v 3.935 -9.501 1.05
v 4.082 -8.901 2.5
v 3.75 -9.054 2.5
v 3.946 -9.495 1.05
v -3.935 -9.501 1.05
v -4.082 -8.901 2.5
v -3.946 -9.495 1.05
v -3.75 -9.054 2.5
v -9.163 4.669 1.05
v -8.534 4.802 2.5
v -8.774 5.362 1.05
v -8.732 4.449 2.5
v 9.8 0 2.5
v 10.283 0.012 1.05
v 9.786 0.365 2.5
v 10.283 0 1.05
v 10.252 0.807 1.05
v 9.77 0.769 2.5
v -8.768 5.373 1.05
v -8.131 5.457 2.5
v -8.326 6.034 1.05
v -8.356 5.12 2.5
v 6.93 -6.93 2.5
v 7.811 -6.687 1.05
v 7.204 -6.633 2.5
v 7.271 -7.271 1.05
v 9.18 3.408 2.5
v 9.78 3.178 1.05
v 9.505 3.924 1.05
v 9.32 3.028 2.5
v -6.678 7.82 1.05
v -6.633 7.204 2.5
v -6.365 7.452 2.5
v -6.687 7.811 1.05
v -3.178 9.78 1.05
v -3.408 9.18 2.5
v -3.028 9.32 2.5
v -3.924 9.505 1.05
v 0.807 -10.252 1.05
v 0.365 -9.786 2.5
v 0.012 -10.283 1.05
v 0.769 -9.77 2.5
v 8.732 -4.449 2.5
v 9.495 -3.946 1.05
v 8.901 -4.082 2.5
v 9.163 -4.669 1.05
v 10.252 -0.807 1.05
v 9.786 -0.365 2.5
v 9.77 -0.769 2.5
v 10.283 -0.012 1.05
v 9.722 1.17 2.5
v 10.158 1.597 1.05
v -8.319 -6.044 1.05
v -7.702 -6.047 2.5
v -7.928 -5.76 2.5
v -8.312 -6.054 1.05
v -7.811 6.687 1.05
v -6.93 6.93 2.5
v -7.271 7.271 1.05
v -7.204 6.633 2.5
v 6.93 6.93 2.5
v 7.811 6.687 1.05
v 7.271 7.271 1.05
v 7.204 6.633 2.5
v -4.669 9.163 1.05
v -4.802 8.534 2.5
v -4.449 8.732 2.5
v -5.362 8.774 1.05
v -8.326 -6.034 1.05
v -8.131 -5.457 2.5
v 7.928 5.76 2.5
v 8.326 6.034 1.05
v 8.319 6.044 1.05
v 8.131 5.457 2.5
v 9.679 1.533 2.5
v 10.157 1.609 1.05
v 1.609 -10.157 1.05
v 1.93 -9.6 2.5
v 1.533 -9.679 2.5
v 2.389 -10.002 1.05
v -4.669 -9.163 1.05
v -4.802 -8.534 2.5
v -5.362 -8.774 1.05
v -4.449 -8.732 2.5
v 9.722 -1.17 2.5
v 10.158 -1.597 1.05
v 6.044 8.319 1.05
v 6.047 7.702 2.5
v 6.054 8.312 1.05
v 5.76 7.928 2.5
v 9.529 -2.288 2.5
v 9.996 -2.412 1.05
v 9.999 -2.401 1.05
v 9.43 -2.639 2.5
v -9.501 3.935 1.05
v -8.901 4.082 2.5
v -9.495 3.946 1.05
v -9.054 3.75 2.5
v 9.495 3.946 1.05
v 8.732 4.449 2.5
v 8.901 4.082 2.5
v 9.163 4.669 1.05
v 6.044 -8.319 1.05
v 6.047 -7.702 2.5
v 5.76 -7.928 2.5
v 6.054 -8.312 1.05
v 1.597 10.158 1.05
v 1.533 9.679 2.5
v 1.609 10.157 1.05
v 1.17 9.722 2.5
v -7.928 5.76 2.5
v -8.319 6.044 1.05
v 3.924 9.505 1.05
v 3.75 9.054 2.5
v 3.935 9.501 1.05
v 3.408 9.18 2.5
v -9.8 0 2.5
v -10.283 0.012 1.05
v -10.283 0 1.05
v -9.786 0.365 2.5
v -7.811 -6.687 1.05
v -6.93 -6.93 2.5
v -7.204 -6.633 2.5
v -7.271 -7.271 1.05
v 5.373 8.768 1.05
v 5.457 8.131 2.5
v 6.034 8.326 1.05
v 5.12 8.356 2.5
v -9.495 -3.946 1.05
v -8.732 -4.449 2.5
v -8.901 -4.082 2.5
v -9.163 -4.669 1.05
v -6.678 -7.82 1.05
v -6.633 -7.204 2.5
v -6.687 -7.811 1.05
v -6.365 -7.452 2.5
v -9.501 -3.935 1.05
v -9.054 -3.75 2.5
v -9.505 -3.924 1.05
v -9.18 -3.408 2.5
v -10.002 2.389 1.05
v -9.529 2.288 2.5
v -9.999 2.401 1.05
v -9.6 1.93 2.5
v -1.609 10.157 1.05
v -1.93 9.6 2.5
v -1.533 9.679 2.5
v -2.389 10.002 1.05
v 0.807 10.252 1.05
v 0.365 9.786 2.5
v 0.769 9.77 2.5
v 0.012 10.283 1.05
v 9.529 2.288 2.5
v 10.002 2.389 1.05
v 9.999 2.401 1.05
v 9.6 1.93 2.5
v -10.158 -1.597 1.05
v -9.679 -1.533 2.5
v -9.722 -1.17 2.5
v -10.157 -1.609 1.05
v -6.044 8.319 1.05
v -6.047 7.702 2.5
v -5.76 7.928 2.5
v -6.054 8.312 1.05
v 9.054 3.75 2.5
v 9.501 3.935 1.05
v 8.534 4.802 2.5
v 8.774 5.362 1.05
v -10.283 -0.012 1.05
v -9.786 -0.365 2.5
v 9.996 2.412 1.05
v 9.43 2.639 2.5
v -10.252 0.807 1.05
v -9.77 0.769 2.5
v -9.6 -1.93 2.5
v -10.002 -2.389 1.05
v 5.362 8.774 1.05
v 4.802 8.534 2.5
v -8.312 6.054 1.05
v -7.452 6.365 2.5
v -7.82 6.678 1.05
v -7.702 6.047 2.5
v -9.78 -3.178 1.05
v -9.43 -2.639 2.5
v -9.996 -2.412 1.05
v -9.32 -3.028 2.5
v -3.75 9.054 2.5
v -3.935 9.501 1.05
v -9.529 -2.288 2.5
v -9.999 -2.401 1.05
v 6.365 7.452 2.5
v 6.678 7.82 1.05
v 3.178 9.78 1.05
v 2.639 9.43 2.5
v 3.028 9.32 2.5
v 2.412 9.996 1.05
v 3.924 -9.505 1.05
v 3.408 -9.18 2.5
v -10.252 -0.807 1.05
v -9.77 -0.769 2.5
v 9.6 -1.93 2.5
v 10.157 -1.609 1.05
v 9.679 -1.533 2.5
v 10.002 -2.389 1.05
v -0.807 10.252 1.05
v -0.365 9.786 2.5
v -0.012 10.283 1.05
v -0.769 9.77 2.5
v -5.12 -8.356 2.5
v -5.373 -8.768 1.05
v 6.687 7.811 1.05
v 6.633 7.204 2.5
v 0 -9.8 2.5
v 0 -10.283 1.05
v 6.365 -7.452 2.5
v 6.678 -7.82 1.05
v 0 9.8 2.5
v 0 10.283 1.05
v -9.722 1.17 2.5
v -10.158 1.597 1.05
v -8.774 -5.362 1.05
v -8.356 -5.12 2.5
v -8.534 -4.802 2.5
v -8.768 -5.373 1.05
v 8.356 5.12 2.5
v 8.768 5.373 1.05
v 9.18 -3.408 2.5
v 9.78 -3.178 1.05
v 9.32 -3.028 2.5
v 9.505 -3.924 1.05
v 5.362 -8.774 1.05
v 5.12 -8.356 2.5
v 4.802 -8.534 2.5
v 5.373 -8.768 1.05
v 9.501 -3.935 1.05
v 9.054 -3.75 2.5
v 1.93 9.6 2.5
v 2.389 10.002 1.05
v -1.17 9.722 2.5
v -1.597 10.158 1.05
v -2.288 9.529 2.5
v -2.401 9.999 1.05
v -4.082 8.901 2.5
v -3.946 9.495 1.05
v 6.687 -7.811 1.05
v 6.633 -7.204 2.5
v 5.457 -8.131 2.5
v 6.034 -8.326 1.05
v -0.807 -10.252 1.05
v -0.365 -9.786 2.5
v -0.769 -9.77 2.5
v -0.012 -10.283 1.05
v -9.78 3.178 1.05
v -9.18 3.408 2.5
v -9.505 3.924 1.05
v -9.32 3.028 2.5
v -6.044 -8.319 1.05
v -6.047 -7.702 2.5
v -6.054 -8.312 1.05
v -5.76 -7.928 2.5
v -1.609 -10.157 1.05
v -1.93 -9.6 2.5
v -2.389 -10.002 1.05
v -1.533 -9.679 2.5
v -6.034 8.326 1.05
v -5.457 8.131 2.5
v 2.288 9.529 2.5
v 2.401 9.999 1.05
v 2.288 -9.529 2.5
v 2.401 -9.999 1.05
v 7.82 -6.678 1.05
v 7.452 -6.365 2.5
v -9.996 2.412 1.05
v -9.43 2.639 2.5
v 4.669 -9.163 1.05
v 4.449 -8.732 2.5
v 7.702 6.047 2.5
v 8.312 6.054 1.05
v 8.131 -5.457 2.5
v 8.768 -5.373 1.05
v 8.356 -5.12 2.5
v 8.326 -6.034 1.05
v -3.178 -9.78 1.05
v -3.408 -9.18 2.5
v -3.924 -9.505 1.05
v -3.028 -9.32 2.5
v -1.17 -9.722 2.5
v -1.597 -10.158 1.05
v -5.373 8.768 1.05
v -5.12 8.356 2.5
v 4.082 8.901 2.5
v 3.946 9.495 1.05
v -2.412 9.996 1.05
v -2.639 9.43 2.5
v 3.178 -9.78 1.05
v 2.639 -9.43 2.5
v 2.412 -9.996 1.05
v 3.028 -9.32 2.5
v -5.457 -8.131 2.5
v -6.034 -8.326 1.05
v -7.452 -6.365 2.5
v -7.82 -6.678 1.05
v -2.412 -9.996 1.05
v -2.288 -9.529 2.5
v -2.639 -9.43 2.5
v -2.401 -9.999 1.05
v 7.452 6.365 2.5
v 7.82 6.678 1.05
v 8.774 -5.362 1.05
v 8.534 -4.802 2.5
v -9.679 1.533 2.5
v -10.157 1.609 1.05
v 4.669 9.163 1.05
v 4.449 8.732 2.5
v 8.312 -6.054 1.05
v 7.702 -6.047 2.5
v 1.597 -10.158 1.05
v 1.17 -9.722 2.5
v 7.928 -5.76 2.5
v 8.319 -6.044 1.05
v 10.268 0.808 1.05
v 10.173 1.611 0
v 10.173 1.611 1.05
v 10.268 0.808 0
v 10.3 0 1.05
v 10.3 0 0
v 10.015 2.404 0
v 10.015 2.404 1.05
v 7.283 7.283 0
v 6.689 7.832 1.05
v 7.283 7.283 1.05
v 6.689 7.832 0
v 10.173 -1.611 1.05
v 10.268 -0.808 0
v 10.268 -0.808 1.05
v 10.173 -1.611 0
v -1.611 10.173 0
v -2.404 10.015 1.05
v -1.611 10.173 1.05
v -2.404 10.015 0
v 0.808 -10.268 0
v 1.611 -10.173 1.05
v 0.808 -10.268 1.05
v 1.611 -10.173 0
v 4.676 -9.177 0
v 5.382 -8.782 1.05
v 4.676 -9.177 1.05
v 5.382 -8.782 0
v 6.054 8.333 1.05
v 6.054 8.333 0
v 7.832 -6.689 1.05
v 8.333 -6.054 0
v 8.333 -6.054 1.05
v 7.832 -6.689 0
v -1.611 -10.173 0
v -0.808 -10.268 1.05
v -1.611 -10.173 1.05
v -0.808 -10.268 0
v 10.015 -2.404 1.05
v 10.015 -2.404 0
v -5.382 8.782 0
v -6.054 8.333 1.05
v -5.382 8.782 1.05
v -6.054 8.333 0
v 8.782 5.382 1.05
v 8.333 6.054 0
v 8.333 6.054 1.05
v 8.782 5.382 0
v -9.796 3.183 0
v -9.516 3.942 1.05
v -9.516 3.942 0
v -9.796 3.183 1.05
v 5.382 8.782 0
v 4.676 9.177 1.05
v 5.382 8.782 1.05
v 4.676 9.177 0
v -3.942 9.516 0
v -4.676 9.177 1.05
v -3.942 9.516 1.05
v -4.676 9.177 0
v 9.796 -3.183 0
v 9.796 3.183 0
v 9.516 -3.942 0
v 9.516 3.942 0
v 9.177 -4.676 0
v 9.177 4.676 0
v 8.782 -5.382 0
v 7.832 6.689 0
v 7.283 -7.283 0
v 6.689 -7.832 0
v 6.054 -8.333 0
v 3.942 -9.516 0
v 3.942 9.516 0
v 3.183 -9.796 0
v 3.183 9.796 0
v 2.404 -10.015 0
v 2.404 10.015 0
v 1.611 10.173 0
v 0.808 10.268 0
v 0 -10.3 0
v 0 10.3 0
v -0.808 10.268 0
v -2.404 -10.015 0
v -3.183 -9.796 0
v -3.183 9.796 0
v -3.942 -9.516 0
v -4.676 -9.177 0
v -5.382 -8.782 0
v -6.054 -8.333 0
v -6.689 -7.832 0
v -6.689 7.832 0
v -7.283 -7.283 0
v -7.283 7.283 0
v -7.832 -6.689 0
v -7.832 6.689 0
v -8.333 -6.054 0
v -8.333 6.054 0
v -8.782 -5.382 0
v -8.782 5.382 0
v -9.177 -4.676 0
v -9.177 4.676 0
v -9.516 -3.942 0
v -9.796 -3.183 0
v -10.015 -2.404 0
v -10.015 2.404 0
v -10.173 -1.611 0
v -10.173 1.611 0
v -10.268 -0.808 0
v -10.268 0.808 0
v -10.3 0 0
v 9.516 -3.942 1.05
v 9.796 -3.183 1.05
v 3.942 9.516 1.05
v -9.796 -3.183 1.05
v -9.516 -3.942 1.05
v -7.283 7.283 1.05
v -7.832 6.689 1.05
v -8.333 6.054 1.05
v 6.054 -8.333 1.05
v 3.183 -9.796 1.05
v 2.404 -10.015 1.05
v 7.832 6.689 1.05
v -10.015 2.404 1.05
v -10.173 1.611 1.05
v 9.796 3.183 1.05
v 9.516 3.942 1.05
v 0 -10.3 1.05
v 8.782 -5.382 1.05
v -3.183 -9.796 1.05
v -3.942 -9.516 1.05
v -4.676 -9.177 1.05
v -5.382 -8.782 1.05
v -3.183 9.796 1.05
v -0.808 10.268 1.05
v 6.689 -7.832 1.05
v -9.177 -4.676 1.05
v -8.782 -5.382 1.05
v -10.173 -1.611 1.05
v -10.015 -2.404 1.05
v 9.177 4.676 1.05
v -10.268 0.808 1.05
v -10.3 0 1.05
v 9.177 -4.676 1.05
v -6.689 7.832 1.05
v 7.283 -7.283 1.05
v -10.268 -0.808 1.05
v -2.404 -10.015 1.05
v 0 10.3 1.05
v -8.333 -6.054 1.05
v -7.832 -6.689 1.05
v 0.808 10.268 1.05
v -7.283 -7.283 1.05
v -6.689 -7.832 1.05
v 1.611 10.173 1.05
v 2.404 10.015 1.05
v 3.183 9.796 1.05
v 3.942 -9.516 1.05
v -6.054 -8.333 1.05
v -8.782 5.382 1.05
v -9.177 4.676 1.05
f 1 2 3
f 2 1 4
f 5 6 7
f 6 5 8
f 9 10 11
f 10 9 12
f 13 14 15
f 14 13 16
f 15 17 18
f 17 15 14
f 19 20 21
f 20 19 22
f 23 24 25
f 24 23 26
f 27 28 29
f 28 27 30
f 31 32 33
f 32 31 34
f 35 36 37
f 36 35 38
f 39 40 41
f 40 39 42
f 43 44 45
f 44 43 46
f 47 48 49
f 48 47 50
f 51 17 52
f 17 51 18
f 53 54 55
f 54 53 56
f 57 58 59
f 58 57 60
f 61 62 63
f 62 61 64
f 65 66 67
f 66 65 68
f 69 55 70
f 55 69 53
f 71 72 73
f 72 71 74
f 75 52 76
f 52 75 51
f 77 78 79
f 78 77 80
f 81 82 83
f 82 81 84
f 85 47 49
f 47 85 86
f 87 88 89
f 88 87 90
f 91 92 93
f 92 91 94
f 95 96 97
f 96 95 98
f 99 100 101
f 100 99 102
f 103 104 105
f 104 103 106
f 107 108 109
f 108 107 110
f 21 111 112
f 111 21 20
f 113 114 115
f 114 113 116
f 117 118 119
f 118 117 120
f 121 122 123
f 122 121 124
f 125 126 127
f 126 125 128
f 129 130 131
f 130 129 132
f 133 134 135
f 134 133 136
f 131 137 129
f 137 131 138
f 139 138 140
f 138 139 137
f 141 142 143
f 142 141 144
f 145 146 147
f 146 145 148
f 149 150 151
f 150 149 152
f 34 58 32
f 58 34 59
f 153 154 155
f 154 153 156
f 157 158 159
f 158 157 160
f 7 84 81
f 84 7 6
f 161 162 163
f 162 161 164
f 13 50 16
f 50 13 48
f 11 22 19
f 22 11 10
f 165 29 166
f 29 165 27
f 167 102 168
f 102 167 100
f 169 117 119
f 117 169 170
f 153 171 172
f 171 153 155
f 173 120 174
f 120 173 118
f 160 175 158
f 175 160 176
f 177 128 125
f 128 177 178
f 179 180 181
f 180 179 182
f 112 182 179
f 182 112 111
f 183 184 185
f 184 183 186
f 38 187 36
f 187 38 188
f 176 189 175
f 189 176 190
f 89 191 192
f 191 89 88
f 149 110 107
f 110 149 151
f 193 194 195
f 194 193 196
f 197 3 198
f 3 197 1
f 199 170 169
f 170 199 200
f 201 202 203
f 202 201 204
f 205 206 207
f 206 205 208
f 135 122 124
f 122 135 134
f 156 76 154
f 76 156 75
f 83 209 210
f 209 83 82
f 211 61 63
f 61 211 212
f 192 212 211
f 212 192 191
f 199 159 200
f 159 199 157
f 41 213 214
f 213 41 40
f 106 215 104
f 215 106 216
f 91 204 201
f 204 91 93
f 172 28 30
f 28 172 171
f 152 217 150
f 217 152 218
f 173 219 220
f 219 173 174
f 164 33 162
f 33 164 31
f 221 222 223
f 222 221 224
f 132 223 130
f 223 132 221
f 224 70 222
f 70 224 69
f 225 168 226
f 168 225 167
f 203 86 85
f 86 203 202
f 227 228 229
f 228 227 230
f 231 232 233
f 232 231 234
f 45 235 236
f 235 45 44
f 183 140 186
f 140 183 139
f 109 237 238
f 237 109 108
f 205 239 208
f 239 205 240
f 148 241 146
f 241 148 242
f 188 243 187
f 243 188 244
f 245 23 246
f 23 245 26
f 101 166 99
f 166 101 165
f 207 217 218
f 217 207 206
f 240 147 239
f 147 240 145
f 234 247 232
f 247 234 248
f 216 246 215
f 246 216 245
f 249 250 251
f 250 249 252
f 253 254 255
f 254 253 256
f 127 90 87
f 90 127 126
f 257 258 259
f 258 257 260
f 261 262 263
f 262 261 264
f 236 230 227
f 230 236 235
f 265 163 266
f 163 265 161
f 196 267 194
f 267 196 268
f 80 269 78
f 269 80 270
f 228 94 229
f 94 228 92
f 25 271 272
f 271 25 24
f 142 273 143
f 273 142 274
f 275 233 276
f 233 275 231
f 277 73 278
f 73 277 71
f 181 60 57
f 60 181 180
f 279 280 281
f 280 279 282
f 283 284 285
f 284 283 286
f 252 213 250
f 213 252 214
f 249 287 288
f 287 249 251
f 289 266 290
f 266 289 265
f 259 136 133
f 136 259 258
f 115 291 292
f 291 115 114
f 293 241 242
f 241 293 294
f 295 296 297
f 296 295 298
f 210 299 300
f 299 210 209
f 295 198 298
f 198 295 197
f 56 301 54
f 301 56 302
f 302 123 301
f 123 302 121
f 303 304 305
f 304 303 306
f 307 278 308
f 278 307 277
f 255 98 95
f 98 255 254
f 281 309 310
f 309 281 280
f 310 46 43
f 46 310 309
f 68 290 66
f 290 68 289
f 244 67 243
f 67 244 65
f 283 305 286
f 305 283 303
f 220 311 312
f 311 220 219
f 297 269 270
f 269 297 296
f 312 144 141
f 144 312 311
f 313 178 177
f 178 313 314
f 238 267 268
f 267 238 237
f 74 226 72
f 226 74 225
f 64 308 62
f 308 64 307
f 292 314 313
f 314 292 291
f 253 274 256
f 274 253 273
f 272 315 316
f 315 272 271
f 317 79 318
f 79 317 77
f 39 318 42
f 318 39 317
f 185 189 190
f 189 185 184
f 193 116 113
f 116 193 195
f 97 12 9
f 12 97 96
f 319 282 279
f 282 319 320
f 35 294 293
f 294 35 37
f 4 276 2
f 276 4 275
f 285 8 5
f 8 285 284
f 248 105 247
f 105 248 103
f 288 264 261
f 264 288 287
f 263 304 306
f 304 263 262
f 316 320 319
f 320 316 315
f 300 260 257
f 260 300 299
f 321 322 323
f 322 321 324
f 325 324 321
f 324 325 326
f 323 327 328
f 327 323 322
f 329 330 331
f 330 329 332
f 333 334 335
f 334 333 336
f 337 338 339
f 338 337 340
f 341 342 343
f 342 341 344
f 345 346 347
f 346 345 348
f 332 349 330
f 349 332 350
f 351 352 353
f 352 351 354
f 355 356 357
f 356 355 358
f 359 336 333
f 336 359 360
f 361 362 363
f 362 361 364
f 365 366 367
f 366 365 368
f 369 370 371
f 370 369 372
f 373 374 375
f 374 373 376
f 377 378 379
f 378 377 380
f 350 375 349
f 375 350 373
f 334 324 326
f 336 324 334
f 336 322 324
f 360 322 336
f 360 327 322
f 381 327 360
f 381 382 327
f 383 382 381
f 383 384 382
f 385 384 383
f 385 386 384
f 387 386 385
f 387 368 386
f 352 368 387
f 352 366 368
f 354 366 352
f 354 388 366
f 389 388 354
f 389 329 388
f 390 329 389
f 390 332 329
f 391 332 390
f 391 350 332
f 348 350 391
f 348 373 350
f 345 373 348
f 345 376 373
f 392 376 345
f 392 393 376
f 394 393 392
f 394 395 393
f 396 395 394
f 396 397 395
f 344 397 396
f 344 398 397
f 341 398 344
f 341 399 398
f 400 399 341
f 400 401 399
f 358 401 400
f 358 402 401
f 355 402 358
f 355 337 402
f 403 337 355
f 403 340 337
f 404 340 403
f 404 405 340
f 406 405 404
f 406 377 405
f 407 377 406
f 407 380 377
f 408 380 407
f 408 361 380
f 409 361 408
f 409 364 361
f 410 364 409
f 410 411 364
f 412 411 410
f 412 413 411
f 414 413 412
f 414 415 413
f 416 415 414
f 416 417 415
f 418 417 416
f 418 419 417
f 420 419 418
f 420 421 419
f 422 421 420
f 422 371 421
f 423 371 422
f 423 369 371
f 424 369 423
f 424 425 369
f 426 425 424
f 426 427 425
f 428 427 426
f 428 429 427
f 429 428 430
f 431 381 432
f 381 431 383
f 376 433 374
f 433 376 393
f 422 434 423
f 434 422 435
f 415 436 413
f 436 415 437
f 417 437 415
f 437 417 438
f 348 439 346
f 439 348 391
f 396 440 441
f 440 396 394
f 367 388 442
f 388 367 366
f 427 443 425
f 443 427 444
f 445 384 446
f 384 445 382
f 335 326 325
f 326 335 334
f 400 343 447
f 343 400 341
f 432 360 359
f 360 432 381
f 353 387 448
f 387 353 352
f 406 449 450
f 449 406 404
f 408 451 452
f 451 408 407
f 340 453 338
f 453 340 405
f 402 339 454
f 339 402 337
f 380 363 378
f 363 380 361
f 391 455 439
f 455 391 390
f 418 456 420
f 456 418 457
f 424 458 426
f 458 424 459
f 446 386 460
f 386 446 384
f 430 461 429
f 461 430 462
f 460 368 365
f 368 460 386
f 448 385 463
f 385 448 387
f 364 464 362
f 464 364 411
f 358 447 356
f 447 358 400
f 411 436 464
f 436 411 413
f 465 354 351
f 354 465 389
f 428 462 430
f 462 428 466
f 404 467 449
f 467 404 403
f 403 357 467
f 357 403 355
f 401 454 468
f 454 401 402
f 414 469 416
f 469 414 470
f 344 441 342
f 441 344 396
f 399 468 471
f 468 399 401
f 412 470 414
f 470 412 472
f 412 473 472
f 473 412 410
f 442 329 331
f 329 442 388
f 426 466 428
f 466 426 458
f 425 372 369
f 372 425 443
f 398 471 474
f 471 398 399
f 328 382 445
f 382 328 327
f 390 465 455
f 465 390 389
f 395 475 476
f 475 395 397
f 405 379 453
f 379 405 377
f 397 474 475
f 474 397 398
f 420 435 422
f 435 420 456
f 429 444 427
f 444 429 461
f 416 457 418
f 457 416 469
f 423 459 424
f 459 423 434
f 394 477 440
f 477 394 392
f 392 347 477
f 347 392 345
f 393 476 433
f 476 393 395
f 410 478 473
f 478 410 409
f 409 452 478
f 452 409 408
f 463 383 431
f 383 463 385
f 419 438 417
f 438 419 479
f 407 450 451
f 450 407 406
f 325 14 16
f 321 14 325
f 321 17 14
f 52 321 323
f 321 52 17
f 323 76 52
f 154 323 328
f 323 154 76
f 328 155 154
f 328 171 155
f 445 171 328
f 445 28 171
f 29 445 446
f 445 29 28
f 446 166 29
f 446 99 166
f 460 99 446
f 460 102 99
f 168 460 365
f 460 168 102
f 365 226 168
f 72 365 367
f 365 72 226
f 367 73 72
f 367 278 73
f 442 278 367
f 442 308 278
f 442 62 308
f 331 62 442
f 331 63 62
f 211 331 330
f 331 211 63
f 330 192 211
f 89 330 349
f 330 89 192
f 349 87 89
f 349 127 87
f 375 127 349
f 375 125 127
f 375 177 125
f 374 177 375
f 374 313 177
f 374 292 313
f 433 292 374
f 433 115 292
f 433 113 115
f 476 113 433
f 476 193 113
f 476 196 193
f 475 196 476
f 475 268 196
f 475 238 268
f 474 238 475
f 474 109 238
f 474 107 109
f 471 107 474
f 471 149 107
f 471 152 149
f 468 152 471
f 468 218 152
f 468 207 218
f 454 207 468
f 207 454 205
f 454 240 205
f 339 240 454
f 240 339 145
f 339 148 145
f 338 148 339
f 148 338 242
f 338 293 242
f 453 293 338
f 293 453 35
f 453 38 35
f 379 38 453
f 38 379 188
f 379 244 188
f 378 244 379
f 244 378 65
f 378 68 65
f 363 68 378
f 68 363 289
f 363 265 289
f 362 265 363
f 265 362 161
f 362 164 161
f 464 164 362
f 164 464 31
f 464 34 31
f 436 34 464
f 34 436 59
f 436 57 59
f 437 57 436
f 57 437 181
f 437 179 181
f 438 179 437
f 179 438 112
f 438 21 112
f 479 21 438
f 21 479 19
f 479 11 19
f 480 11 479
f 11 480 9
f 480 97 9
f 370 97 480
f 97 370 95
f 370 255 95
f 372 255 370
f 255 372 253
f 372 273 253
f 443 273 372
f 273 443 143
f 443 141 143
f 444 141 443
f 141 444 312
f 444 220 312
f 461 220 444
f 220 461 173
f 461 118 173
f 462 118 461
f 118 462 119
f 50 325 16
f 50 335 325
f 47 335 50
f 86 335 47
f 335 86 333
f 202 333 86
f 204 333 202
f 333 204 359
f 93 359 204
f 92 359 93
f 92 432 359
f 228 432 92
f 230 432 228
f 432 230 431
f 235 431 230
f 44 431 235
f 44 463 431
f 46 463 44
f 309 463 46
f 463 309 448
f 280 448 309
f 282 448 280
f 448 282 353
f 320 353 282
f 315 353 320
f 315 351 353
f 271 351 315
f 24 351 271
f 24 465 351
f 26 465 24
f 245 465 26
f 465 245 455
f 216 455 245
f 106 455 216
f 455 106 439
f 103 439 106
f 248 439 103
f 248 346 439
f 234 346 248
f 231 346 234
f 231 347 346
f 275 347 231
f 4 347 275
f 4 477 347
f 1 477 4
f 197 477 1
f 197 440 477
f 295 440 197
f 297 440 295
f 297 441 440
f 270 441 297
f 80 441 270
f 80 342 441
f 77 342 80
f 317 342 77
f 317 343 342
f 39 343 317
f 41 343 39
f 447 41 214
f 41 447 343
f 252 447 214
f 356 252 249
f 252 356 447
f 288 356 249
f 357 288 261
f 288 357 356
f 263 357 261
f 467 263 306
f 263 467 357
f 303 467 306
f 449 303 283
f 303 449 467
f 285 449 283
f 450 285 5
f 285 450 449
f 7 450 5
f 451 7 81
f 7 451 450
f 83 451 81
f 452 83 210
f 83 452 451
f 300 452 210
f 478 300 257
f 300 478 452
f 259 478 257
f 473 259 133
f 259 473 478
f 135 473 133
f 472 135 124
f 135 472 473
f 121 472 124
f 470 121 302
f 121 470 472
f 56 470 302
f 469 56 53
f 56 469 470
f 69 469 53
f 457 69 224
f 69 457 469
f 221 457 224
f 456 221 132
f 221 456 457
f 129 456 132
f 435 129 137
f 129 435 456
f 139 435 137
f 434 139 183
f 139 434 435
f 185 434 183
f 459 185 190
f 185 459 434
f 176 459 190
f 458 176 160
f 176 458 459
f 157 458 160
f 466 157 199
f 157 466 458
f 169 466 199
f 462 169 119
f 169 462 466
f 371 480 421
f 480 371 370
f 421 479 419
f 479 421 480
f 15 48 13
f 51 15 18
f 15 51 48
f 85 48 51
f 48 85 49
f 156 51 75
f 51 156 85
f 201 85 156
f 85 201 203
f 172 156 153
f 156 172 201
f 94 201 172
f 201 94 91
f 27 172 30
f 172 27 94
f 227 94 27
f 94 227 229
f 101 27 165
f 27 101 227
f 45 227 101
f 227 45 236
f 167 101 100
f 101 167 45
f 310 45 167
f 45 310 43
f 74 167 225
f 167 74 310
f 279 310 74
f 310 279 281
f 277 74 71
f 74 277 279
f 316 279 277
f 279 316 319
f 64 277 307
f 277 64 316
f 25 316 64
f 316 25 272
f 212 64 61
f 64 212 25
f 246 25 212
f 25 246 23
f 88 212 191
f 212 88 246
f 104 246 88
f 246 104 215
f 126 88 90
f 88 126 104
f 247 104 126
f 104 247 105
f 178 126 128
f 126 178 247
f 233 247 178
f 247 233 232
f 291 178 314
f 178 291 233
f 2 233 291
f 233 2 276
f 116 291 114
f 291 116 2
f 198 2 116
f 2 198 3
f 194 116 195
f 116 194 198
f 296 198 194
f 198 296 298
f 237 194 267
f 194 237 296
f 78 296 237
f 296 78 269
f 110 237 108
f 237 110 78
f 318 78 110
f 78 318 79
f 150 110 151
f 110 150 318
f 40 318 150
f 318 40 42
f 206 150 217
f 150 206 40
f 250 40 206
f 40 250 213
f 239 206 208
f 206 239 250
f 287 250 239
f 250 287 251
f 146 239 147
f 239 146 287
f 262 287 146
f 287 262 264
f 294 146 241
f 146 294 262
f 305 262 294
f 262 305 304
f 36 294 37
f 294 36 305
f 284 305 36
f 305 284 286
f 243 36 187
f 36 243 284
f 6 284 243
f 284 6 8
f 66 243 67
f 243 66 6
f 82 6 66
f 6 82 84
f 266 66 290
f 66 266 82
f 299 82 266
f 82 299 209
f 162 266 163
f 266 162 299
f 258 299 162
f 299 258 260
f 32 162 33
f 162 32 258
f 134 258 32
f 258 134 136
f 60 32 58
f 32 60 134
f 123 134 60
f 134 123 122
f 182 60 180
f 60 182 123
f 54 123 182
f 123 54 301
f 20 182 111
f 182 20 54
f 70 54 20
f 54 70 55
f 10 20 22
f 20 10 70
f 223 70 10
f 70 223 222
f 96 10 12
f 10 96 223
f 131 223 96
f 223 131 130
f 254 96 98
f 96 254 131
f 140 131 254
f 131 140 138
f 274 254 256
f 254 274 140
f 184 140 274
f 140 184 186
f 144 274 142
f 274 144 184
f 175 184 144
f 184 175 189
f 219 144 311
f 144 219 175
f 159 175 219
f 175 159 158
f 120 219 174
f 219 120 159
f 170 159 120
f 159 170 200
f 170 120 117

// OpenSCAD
$fn=80;

difference() {
   union() { 
      translate([0,0,1.0]) cylinder(r1=20.6/2, r2=18.6/2, h=3);
      cylinder(r=20.6/2, h=1.05);
   }
   translate([0,0,2.5]) cylinder(r=12,h=4);
}
